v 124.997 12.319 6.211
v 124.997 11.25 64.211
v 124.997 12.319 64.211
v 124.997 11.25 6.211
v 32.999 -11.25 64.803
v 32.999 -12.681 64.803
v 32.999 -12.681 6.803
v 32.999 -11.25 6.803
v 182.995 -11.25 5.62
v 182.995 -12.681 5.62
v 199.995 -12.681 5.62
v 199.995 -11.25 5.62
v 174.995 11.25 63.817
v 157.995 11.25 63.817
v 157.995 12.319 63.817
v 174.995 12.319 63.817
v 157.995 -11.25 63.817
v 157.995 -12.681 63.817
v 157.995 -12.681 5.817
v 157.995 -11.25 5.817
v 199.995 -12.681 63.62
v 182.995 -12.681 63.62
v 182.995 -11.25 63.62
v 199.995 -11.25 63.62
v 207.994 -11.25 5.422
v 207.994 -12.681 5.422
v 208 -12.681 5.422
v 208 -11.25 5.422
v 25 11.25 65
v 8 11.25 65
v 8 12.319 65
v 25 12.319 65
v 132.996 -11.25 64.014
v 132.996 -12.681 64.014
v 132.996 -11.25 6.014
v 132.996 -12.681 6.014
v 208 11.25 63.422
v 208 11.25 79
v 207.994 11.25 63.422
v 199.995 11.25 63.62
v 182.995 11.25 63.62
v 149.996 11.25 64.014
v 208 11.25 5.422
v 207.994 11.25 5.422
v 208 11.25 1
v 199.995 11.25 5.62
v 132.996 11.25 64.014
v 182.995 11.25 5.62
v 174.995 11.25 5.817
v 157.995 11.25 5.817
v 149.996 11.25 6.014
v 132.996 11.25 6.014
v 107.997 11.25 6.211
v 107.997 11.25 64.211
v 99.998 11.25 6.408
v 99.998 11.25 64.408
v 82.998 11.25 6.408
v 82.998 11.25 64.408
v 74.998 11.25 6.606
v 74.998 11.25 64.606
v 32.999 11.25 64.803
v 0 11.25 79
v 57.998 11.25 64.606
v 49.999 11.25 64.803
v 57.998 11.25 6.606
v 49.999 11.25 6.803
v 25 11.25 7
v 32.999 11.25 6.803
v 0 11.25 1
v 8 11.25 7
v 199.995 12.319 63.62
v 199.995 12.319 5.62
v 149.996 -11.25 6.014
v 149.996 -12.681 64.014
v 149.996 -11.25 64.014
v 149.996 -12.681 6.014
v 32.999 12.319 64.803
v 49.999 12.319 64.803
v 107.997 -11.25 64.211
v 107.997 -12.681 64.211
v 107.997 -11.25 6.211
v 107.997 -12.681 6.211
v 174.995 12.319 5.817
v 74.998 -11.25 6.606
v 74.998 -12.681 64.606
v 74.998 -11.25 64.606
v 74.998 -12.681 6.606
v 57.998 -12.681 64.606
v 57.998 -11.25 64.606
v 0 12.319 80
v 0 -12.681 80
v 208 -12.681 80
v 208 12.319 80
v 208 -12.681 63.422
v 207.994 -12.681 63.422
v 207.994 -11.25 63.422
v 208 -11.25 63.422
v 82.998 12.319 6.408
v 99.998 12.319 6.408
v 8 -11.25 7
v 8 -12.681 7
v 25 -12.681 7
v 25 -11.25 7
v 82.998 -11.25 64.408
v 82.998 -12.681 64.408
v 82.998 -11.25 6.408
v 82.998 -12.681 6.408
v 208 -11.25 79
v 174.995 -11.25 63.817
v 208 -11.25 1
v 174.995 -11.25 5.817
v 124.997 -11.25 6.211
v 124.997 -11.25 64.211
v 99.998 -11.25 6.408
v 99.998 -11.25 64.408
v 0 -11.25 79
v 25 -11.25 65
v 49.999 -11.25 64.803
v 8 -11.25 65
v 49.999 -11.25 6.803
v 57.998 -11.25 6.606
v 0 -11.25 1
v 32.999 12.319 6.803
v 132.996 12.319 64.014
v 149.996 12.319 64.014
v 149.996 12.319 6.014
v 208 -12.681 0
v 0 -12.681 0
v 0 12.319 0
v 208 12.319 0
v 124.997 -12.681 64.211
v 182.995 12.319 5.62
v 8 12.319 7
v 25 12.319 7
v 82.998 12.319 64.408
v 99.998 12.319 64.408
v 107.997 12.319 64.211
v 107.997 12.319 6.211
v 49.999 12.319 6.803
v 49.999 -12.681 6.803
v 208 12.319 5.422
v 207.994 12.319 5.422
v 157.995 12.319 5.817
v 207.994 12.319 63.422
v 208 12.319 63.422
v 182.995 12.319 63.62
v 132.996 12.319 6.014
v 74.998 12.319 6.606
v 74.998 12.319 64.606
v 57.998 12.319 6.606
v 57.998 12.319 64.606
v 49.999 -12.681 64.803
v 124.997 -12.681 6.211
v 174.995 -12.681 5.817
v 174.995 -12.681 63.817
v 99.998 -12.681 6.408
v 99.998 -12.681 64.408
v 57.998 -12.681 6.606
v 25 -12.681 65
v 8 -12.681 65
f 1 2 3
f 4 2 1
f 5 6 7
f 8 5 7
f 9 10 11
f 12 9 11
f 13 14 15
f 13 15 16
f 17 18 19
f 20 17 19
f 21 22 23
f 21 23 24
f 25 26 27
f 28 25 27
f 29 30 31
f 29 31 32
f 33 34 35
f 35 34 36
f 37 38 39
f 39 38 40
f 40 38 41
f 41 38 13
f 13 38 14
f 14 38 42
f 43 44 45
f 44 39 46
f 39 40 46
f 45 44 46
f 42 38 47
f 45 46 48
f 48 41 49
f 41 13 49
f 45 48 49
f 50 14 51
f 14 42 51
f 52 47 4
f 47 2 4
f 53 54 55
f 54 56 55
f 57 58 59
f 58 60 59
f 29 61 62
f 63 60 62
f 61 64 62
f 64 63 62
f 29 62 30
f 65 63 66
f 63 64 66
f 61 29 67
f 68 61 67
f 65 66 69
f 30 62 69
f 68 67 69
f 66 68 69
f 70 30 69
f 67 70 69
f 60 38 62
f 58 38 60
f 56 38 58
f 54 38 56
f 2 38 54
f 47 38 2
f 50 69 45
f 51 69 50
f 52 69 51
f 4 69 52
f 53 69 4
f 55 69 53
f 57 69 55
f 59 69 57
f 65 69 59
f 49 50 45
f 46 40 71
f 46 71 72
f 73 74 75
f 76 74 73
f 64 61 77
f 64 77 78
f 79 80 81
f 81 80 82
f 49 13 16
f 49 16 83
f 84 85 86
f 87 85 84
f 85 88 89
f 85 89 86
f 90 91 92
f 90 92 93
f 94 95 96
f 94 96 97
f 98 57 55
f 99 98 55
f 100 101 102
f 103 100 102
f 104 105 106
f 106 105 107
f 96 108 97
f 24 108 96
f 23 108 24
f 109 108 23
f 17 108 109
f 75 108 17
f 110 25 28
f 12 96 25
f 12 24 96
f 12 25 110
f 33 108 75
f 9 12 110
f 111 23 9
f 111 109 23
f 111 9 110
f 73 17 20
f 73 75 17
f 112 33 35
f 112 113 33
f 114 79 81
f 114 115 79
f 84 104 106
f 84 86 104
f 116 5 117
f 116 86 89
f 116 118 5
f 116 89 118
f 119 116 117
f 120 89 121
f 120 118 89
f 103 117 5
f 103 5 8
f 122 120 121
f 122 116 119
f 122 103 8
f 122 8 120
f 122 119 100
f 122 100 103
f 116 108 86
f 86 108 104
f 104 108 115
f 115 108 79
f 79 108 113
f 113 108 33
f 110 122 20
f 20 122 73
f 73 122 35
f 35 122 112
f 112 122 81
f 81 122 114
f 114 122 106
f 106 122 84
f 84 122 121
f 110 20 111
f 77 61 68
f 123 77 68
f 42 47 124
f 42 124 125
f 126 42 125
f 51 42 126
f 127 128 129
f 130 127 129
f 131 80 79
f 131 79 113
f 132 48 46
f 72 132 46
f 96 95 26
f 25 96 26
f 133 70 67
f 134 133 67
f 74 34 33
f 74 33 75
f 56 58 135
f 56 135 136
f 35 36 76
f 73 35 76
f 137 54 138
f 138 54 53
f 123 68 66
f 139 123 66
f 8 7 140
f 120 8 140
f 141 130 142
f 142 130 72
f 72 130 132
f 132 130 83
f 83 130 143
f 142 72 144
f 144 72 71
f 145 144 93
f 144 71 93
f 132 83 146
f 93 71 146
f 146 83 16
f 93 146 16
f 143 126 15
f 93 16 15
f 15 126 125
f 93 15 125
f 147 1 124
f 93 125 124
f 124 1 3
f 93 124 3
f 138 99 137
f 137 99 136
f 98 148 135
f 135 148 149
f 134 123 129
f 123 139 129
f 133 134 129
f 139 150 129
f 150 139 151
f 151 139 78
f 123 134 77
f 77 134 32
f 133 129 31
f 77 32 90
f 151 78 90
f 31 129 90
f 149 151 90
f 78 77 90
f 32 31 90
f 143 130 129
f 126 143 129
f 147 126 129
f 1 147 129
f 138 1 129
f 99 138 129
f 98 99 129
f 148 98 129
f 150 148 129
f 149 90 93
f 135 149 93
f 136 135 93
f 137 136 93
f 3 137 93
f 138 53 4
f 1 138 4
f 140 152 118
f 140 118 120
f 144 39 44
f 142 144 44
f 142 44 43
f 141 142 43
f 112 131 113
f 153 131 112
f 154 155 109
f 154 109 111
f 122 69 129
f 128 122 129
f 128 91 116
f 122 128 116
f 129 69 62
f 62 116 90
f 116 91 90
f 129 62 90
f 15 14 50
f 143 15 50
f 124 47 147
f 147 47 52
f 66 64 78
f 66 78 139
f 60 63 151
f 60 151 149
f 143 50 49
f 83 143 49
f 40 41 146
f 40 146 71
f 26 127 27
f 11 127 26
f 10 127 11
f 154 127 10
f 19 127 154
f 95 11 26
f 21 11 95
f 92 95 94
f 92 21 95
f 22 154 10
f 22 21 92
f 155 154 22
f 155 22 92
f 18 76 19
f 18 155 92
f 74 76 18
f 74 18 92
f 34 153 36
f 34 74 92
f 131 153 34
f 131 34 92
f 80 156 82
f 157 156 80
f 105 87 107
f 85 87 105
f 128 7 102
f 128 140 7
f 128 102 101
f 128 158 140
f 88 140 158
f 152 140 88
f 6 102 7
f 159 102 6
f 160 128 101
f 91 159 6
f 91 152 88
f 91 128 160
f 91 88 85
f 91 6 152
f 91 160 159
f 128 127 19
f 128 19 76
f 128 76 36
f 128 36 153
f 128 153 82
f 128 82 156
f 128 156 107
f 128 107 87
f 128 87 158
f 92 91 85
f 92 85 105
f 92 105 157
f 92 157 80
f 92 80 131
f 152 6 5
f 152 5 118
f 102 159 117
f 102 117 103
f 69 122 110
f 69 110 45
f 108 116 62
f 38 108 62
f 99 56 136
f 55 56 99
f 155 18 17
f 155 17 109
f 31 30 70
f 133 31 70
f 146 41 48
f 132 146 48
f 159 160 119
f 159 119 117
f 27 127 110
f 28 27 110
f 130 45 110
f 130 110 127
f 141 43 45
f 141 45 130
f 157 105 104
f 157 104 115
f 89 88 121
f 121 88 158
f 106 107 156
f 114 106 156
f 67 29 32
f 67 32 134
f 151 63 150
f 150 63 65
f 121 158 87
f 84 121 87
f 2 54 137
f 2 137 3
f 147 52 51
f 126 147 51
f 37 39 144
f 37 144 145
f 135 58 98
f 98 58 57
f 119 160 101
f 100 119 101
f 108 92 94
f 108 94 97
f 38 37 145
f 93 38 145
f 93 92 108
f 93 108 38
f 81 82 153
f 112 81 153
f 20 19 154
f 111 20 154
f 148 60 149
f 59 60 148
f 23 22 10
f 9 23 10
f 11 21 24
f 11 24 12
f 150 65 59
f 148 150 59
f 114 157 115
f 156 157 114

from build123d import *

# Parameters (mm, degrees)
SKETCH_W        = 25
SKETCH_H        = 80
PAD_DEPTH       = 208
SKETCH001_W     = 22.5
SKETCH001_H     = 78
POCKET_DEPTH    = 1000
SKETCH002_W     = 58
SKETCH002_H     = 17
POCKET001_DEPTH = 26


with BuildPart() as part:
    # Sketch → Pad (new body)
    with BuildSketch(Plane.YZ):
        with Locations((-0.181115, 40)):
            Rectangle(SKETCH_W, SKETCH_H)
    extrude(amount=PAD_DEPTH)

    # Sketch001 (on Face5 of Pad) → Pocket (cut)
    with BuildSketch(Plane(origin=(0, 0, 0), x_dir=(0, 1, 0), z_dir=(-1, 0, 0))):
        with Locations((0, -40)):
            Rectangle(SKETCH001_W, SKETCH001_H)
    extrude(amount=-POCKET_DEPTH, mode=Mode.SUBTRACT)

    # Sketch002 (on Face2 of Pocket) → Pocket001 (cut)
    with BuildSketch(Plane(origin=(0, -12.681115, 0), x_dir=(0, 0, -1), z_dir=(0, -1, 0))):
        with Locations((-36, 16.5)):
            Rectangle(SKETCH002_W, SKETCH002_H)
        with Locations((-35.802797, 41.499222)):
            Rectangle(SKETCH002_W, SKETCH002_H)
        with Locations((-35.605594, 66.498444)):
            Rectangle(SKETCH002_W, SKETCH002_H)
        with Locations((-35.408391, 91.497667)):
            Rectangle(SKETCH002_W, SKETCH002_H)
        with Locations((-35.211188, 116.496889)):
            Rectangle(SKETCH002_W, SKETCH002_H)
        with Locations((-35.013985, 141.496111)):
            Rectangle(SKETCH002_W, SKETCH002_H)
        with Locations((-34.816782, 166.495333)):
            Rectangle(SKETCH002_W, SKETCH002_H)
        with Locations((-34.619579, 191.494555)):
            Rectangle(SKETCH002_W, SKETCH002_H)
        with Locations((-34.422376, 216.493778)):
            Rectangle(SKETCH002_W, SKETCH002_H)
        with Locations((-34.225173, 241.493)):
            Rectangle(SKETCH002_W, SKETCH002_H)
    extrude(amount=-POCKET001_DEPTH, mode=Mode.SUBTRACT)


solid = part.part
